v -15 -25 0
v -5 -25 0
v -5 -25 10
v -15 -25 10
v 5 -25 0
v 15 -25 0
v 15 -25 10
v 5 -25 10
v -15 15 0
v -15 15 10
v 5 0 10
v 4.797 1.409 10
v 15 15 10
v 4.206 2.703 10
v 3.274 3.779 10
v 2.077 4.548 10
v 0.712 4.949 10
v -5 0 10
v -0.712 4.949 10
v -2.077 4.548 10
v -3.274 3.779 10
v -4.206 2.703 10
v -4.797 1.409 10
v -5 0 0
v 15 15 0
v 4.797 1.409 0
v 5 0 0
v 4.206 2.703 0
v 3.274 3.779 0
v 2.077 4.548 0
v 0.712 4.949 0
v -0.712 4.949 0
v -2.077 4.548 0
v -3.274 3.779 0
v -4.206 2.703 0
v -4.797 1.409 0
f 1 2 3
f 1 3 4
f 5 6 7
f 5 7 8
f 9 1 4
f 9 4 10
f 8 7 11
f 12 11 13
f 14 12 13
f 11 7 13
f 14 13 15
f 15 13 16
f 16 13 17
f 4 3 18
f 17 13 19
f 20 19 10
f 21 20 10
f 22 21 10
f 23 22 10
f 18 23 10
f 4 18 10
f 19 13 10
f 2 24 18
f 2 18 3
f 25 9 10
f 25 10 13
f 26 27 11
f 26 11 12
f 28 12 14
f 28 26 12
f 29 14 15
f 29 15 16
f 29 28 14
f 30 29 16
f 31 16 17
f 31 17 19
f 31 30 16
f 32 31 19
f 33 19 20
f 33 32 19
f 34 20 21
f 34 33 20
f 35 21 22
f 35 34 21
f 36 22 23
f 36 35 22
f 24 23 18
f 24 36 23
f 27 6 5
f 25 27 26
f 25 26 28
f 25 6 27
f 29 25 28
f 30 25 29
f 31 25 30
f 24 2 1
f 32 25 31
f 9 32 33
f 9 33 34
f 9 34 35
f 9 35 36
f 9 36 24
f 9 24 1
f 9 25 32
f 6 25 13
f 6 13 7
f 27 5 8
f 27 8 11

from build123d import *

# Parameters (mm, degrees)
BOSS_EXTRUDE1_DEPTH = 10


with BuildPart() as part:
    # Sketch1 → Boss-Extrude1 (new body)
    with BuildSketch(Plane.XY):
        with BuildLine():
            Line((-5, 0), (-5, -25))
            Line((-5, -25), (-15, -25))
            Line((-15, -25), (-15, 15))
            Line((-15, 15), (15, 15))
            Line((15, 15), (15, -25))
            Line((15, -25), (5, -25))
            Line((5, -25), (5, 0))
            ThreePointArc((5, 0), (0, 5), (-5, 0))
        make_face()
    extrude(amount=BOSS_EXTRUDE1_DEPTH)


solid = part.part
